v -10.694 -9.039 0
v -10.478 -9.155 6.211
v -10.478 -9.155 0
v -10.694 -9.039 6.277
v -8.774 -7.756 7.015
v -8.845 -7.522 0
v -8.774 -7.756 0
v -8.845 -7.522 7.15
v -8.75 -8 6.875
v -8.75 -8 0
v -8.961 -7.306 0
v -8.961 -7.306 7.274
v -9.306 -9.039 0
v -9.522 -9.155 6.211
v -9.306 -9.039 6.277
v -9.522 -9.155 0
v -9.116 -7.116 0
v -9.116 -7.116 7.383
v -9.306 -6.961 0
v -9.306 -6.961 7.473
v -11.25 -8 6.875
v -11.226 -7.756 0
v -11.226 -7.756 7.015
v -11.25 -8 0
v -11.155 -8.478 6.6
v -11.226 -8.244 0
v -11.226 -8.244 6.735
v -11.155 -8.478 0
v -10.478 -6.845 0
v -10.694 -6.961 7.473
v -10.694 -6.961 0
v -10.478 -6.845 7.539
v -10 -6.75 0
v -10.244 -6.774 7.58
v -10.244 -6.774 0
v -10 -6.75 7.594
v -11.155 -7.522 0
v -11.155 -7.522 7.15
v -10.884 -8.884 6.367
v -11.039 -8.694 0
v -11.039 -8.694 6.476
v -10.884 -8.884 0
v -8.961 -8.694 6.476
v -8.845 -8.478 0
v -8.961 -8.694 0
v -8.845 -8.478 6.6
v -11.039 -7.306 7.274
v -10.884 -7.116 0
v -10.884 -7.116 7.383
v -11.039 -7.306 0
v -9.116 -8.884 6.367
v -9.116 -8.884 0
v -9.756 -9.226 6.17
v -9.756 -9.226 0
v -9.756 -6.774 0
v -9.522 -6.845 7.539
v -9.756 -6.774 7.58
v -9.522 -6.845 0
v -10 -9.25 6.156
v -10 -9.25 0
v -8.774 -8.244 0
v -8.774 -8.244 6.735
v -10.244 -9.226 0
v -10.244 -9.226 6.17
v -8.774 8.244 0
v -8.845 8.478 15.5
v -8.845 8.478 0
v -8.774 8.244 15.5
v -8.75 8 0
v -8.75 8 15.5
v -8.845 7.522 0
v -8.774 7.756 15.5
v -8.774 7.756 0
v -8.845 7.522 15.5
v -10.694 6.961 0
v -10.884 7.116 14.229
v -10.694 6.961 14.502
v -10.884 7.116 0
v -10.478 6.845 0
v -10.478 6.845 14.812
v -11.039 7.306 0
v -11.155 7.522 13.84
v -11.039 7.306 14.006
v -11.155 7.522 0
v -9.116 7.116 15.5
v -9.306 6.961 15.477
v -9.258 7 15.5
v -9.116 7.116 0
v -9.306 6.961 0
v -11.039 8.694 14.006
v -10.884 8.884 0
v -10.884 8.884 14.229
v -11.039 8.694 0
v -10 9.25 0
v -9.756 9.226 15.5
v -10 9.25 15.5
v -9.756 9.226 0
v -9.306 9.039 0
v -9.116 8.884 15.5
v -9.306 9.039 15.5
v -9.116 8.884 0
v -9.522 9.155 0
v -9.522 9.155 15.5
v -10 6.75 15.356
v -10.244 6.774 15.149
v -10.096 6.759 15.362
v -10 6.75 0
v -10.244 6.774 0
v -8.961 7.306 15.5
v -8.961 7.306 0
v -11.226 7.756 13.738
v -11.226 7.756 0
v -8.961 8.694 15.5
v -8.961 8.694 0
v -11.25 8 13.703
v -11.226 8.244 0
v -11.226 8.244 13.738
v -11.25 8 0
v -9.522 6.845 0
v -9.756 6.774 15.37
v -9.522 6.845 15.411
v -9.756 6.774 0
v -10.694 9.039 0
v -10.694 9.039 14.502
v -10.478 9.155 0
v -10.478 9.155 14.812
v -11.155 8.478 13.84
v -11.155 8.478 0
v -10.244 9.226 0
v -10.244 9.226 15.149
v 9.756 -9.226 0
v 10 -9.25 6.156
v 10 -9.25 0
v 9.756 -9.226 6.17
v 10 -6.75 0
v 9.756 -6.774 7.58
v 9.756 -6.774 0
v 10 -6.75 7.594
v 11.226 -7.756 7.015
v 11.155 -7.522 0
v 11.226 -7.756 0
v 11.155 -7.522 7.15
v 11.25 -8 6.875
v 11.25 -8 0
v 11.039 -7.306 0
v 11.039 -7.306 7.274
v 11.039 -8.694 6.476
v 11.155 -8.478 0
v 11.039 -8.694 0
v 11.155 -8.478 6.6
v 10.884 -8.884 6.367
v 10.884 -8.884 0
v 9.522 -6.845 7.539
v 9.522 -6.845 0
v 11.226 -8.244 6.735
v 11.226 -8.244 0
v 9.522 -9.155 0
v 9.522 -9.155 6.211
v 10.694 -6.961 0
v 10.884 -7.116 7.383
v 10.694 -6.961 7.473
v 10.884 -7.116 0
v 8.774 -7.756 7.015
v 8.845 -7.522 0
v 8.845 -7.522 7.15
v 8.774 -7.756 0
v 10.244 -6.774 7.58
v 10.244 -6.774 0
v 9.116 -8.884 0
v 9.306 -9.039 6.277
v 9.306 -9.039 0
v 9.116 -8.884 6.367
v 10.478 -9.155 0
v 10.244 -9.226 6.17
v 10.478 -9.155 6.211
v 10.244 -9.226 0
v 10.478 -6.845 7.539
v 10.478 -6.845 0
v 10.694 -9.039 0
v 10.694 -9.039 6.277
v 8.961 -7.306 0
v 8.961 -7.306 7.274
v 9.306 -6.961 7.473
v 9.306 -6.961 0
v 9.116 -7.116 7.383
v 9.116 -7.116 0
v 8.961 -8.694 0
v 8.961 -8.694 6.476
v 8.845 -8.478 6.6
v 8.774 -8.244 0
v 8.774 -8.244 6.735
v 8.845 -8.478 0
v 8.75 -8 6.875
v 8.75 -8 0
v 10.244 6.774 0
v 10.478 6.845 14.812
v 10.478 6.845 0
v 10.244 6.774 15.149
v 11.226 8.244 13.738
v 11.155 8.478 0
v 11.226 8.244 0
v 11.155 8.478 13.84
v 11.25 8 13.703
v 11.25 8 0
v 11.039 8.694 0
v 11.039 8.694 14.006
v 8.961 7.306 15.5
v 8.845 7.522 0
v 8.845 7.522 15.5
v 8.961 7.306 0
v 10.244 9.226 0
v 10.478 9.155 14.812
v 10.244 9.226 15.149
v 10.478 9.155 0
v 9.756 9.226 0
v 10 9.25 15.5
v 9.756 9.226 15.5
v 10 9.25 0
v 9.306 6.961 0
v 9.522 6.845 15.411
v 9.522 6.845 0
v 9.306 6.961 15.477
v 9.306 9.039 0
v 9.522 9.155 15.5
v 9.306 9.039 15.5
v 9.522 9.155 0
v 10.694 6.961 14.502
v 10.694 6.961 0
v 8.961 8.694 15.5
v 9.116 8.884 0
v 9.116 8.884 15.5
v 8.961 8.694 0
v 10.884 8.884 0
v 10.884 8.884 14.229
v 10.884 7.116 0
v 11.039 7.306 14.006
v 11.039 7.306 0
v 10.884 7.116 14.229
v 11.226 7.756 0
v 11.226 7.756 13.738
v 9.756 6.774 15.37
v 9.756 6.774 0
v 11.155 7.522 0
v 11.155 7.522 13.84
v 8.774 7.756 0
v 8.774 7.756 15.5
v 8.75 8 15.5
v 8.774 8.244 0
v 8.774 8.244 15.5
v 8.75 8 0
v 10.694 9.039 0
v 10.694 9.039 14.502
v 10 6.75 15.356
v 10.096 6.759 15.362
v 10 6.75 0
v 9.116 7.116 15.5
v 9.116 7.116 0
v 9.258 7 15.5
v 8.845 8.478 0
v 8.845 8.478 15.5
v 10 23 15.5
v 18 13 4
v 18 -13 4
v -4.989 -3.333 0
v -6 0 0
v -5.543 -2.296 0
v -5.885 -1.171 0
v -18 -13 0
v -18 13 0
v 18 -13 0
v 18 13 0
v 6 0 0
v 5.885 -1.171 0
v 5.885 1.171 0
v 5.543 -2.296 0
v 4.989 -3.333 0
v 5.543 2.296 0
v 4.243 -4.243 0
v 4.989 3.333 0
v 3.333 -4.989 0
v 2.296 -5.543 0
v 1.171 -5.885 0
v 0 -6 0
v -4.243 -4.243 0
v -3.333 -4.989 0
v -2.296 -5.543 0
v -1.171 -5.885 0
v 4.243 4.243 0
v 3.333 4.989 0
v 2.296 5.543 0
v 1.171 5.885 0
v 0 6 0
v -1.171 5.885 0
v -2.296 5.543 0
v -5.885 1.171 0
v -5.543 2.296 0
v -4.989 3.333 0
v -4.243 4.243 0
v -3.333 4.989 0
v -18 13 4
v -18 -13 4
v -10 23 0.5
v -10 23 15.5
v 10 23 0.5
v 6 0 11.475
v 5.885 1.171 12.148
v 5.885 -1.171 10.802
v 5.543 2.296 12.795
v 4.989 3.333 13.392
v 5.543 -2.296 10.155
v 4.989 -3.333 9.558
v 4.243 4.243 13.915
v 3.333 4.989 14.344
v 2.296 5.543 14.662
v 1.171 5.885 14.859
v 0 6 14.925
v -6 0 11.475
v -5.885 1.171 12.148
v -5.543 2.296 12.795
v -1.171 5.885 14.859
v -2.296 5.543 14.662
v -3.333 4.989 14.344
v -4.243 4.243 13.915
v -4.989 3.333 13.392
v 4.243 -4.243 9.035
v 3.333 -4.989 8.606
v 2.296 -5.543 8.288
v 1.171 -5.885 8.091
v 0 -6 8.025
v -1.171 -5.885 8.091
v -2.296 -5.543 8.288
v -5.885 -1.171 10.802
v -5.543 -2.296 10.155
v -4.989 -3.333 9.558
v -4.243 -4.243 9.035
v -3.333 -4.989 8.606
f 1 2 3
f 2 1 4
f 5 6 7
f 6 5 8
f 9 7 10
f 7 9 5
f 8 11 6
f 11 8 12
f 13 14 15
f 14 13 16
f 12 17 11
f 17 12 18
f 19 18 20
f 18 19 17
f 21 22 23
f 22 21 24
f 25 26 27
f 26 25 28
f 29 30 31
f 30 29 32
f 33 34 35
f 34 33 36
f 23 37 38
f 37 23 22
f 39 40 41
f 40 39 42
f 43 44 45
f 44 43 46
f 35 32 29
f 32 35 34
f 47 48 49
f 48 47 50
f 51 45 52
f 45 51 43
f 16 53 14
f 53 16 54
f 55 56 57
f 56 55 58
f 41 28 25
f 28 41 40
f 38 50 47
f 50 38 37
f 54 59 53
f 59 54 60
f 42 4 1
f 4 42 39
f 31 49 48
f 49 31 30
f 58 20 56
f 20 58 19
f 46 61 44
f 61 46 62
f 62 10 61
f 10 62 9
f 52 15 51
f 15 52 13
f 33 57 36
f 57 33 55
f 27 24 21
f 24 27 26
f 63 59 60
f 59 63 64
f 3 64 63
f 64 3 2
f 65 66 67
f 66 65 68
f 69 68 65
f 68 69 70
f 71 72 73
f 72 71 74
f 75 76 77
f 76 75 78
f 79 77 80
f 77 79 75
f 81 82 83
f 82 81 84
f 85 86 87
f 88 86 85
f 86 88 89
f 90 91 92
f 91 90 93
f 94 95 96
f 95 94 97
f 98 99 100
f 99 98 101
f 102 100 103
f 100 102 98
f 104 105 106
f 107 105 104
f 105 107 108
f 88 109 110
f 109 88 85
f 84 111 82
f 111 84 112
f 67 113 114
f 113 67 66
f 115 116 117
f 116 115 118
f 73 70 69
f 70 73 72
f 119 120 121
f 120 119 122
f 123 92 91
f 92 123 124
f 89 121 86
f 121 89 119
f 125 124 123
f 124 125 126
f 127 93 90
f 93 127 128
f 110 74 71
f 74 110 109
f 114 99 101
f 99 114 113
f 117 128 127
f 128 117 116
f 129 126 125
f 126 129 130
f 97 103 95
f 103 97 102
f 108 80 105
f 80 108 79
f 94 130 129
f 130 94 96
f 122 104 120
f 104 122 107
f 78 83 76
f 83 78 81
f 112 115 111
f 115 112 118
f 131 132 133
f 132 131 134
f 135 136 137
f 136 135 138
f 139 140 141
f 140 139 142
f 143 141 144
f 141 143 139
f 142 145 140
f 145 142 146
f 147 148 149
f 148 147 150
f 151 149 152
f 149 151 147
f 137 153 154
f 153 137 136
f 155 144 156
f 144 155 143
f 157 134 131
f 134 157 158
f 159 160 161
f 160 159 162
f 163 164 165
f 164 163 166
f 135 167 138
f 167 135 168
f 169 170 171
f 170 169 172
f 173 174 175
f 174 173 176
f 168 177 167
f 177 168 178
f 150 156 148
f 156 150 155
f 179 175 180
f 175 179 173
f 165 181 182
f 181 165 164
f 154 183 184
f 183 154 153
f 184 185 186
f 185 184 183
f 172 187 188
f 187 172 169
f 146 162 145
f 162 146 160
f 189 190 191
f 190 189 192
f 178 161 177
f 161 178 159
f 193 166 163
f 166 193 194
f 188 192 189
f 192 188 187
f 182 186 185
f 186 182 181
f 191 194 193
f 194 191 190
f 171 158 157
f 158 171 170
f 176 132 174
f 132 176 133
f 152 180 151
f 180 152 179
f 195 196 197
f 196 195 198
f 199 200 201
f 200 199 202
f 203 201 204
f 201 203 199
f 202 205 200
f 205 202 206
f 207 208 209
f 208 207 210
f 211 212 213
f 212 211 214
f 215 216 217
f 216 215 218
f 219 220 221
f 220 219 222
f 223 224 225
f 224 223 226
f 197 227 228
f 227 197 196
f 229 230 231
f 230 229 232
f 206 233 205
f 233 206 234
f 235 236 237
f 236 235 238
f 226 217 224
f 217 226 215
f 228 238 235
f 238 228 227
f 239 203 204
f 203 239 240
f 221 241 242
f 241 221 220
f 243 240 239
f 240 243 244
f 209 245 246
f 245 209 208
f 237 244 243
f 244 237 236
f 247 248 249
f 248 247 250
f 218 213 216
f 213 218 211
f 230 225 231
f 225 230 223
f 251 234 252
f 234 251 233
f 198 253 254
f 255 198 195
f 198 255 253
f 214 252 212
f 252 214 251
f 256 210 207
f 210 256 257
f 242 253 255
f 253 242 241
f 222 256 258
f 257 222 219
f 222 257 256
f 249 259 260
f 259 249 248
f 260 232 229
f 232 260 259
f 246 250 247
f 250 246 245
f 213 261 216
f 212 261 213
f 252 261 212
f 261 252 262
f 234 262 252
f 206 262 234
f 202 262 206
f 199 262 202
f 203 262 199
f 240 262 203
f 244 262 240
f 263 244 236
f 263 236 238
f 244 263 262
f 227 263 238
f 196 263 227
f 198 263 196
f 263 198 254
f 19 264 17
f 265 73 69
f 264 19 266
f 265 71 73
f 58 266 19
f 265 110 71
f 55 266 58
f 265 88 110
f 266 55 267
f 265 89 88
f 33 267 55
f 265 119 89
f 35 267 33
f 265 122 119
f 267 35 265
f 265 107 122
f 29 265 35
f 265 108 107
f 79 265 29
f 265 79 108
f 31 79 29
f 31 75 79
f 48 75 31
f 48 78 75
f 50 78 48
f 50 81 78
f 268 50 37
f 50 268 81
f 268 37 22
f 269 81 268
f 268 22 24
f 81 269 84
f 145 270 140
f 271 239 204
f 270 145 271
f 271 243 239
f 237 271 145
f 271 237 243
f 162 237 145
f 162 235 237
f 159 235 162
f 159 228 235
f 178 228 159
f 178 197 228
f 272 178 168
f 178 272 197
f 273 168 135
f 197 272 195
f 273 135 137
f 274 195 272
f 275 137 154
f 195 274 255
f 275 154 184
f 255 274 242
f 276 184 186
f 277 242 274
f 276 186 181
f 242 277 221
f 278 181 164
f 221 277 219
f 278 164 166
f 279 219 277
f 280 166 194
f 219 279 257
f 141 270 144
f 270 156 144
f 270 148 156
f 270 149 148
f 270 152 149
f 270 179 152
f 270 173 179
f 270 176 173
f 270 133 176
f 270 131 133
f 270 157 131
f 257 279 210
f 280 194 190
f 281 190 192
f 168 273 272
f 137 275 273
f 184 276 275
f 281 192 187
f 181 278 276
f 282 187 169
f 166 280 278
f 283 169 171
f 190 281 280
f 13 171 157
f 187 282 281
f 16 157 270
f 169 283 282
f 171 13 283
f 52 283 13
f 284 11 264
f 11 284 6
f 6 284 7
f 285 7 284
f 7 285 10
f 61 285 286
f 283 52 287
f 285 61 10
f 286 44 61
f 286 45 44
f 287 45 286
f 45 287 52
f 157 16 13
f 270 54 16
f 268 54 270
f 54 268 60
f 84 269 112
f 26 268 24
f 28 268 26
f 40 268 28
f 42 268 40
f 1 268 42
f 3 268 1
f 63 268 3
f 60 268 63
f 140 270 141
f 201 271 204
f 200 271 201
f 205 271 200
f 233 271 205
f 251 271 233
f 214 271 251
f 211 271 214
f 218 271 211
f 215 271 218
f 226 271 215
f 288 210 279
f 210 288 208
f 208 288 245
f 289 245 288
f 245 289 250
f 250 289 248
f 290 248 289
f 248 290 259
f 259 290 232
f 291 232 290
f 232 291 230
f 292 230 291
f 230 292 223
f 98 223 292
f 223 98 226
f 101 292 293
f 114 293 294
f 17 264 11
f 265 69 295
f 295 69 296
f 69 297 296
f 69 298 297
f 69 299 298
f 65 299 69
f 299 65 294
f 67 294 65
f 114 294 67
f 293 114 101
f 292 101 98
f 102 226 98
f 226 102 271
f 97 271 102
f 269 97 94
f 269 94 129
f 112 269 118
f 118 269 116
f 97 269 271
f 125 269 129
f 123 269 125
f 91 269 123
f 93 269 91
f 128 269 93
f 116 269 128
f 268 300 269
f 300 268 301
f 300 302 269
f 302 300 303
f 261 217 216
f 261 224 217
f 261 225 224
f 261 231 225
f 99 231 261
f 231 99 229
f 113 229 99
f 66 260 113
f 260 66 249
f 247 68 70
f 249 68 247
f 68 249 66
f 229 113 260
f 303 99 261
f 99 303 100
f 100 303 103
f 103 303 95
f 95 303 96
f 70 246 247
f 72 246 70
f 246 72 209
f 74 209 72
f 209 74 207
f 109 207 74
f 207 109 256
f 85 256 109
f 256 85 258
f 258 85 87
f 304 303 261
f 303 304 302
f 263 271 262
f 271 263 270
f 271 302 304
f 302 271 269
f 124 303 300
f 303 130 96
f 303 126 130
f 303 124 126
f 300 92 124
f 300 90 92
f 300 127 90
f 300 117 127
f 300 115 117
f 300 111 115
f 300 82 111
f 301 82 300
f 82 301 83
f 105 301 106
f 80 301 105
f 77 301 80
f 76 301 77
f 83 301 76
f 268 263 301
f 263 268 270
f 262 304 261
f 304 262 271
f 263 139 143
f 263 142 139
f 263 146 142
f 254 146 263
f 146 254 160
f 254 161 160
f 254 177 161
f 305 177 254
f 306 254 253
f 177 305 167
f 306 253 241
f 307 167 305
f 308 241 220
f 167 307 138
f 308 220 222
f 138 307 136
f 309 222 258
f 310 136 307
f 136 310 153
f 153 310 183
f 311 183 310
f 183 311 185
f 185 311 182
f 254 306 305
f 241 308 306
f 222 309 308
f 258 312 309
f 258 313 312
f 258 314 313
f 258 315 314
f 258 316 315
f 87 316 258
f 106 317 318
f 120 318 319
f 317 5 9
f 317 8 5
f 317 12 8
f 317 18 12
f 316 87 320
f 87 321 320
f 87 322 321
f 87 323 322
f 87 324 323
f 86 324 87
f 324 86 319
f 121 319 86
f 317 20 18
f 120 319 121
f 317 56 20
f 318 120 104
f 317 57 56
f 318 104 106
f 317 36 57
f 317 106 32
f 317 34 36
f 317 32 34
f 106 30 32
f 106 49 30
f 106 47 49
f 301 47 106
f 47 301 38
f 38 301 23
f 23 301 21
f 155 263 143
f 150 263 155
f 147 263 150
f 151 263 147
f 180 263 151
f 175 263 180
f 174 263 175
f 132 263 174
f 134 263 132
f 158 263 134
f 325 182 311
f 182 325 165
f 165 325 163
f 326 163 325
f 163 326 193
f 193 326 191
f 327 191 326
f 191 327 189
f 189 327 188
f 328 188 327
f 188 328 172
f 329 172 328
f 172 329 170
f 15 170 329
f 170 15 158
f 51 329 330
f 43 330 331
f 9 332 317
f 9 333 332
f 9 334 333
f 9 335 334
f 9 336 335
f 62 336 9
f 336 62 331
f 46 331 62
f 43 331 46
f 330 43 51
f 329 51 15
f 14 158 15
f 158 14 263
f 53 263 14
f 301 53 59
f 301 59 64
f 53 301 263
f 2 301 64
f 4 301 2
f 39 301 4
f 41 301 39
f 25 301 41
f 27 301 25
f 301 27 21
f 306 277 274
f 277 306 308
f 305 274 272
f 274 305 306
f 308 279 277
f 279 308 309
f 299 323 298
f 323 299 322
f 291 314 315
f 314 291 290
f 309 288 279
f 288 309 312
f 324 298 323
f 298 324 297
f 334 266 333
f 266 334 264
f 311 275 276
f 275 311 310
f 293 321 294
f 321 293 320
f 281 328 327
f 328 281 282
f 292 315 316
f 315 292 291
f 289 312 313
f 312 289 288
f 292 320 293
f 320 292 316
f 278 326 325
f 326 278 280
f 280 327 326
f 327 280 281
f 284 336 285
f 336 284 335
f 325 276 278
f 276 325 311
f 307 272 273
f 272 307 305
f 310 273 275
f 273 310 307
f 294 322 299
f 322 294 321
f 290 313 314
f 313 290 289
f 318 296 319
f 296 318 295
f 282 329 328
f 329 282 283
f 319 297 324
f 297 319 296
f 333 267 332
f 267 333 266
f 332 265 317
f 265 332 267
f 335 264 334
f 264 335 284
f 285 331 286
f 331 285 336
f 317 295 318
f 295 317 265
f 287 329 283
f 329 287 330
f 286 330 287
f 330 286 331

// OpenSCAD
// =============================================================================
// test_hull_difference.scad
//
// Hull inside a difference: hull a shape then subtract cutouts.
// Pattern from: led_array_holder.scad, m12.scad, many others.
// Expected: a hulled mounting block with screw holes and wire cutout removed.
// =============================================================================

$fn = 32;

difference() {
    // Hull the LED array base to the dovetail block
    hull() {
        // Bottom plate (LED array)
        translate([0, 0, 2]) {
            cube([36, 26, 4], center = true);
        }
        // Dovetail block (simplified)
        translate([0, 15, 8]) {
            cube([20, 16, 15], center = true);
        }
    }

    // Wire/heat hole through the center
    translate([0, 0, -1]) {
        cylinder(r = 6, h = 30);
    }

    // Two mounting screw holes
    for (x = [-10, 10]) {
        for (y = [-8, 8]) {
            translate([x, y, -5]) {
                cylinder(r = 1.25, h = 30);
            }
        }
    }
}
